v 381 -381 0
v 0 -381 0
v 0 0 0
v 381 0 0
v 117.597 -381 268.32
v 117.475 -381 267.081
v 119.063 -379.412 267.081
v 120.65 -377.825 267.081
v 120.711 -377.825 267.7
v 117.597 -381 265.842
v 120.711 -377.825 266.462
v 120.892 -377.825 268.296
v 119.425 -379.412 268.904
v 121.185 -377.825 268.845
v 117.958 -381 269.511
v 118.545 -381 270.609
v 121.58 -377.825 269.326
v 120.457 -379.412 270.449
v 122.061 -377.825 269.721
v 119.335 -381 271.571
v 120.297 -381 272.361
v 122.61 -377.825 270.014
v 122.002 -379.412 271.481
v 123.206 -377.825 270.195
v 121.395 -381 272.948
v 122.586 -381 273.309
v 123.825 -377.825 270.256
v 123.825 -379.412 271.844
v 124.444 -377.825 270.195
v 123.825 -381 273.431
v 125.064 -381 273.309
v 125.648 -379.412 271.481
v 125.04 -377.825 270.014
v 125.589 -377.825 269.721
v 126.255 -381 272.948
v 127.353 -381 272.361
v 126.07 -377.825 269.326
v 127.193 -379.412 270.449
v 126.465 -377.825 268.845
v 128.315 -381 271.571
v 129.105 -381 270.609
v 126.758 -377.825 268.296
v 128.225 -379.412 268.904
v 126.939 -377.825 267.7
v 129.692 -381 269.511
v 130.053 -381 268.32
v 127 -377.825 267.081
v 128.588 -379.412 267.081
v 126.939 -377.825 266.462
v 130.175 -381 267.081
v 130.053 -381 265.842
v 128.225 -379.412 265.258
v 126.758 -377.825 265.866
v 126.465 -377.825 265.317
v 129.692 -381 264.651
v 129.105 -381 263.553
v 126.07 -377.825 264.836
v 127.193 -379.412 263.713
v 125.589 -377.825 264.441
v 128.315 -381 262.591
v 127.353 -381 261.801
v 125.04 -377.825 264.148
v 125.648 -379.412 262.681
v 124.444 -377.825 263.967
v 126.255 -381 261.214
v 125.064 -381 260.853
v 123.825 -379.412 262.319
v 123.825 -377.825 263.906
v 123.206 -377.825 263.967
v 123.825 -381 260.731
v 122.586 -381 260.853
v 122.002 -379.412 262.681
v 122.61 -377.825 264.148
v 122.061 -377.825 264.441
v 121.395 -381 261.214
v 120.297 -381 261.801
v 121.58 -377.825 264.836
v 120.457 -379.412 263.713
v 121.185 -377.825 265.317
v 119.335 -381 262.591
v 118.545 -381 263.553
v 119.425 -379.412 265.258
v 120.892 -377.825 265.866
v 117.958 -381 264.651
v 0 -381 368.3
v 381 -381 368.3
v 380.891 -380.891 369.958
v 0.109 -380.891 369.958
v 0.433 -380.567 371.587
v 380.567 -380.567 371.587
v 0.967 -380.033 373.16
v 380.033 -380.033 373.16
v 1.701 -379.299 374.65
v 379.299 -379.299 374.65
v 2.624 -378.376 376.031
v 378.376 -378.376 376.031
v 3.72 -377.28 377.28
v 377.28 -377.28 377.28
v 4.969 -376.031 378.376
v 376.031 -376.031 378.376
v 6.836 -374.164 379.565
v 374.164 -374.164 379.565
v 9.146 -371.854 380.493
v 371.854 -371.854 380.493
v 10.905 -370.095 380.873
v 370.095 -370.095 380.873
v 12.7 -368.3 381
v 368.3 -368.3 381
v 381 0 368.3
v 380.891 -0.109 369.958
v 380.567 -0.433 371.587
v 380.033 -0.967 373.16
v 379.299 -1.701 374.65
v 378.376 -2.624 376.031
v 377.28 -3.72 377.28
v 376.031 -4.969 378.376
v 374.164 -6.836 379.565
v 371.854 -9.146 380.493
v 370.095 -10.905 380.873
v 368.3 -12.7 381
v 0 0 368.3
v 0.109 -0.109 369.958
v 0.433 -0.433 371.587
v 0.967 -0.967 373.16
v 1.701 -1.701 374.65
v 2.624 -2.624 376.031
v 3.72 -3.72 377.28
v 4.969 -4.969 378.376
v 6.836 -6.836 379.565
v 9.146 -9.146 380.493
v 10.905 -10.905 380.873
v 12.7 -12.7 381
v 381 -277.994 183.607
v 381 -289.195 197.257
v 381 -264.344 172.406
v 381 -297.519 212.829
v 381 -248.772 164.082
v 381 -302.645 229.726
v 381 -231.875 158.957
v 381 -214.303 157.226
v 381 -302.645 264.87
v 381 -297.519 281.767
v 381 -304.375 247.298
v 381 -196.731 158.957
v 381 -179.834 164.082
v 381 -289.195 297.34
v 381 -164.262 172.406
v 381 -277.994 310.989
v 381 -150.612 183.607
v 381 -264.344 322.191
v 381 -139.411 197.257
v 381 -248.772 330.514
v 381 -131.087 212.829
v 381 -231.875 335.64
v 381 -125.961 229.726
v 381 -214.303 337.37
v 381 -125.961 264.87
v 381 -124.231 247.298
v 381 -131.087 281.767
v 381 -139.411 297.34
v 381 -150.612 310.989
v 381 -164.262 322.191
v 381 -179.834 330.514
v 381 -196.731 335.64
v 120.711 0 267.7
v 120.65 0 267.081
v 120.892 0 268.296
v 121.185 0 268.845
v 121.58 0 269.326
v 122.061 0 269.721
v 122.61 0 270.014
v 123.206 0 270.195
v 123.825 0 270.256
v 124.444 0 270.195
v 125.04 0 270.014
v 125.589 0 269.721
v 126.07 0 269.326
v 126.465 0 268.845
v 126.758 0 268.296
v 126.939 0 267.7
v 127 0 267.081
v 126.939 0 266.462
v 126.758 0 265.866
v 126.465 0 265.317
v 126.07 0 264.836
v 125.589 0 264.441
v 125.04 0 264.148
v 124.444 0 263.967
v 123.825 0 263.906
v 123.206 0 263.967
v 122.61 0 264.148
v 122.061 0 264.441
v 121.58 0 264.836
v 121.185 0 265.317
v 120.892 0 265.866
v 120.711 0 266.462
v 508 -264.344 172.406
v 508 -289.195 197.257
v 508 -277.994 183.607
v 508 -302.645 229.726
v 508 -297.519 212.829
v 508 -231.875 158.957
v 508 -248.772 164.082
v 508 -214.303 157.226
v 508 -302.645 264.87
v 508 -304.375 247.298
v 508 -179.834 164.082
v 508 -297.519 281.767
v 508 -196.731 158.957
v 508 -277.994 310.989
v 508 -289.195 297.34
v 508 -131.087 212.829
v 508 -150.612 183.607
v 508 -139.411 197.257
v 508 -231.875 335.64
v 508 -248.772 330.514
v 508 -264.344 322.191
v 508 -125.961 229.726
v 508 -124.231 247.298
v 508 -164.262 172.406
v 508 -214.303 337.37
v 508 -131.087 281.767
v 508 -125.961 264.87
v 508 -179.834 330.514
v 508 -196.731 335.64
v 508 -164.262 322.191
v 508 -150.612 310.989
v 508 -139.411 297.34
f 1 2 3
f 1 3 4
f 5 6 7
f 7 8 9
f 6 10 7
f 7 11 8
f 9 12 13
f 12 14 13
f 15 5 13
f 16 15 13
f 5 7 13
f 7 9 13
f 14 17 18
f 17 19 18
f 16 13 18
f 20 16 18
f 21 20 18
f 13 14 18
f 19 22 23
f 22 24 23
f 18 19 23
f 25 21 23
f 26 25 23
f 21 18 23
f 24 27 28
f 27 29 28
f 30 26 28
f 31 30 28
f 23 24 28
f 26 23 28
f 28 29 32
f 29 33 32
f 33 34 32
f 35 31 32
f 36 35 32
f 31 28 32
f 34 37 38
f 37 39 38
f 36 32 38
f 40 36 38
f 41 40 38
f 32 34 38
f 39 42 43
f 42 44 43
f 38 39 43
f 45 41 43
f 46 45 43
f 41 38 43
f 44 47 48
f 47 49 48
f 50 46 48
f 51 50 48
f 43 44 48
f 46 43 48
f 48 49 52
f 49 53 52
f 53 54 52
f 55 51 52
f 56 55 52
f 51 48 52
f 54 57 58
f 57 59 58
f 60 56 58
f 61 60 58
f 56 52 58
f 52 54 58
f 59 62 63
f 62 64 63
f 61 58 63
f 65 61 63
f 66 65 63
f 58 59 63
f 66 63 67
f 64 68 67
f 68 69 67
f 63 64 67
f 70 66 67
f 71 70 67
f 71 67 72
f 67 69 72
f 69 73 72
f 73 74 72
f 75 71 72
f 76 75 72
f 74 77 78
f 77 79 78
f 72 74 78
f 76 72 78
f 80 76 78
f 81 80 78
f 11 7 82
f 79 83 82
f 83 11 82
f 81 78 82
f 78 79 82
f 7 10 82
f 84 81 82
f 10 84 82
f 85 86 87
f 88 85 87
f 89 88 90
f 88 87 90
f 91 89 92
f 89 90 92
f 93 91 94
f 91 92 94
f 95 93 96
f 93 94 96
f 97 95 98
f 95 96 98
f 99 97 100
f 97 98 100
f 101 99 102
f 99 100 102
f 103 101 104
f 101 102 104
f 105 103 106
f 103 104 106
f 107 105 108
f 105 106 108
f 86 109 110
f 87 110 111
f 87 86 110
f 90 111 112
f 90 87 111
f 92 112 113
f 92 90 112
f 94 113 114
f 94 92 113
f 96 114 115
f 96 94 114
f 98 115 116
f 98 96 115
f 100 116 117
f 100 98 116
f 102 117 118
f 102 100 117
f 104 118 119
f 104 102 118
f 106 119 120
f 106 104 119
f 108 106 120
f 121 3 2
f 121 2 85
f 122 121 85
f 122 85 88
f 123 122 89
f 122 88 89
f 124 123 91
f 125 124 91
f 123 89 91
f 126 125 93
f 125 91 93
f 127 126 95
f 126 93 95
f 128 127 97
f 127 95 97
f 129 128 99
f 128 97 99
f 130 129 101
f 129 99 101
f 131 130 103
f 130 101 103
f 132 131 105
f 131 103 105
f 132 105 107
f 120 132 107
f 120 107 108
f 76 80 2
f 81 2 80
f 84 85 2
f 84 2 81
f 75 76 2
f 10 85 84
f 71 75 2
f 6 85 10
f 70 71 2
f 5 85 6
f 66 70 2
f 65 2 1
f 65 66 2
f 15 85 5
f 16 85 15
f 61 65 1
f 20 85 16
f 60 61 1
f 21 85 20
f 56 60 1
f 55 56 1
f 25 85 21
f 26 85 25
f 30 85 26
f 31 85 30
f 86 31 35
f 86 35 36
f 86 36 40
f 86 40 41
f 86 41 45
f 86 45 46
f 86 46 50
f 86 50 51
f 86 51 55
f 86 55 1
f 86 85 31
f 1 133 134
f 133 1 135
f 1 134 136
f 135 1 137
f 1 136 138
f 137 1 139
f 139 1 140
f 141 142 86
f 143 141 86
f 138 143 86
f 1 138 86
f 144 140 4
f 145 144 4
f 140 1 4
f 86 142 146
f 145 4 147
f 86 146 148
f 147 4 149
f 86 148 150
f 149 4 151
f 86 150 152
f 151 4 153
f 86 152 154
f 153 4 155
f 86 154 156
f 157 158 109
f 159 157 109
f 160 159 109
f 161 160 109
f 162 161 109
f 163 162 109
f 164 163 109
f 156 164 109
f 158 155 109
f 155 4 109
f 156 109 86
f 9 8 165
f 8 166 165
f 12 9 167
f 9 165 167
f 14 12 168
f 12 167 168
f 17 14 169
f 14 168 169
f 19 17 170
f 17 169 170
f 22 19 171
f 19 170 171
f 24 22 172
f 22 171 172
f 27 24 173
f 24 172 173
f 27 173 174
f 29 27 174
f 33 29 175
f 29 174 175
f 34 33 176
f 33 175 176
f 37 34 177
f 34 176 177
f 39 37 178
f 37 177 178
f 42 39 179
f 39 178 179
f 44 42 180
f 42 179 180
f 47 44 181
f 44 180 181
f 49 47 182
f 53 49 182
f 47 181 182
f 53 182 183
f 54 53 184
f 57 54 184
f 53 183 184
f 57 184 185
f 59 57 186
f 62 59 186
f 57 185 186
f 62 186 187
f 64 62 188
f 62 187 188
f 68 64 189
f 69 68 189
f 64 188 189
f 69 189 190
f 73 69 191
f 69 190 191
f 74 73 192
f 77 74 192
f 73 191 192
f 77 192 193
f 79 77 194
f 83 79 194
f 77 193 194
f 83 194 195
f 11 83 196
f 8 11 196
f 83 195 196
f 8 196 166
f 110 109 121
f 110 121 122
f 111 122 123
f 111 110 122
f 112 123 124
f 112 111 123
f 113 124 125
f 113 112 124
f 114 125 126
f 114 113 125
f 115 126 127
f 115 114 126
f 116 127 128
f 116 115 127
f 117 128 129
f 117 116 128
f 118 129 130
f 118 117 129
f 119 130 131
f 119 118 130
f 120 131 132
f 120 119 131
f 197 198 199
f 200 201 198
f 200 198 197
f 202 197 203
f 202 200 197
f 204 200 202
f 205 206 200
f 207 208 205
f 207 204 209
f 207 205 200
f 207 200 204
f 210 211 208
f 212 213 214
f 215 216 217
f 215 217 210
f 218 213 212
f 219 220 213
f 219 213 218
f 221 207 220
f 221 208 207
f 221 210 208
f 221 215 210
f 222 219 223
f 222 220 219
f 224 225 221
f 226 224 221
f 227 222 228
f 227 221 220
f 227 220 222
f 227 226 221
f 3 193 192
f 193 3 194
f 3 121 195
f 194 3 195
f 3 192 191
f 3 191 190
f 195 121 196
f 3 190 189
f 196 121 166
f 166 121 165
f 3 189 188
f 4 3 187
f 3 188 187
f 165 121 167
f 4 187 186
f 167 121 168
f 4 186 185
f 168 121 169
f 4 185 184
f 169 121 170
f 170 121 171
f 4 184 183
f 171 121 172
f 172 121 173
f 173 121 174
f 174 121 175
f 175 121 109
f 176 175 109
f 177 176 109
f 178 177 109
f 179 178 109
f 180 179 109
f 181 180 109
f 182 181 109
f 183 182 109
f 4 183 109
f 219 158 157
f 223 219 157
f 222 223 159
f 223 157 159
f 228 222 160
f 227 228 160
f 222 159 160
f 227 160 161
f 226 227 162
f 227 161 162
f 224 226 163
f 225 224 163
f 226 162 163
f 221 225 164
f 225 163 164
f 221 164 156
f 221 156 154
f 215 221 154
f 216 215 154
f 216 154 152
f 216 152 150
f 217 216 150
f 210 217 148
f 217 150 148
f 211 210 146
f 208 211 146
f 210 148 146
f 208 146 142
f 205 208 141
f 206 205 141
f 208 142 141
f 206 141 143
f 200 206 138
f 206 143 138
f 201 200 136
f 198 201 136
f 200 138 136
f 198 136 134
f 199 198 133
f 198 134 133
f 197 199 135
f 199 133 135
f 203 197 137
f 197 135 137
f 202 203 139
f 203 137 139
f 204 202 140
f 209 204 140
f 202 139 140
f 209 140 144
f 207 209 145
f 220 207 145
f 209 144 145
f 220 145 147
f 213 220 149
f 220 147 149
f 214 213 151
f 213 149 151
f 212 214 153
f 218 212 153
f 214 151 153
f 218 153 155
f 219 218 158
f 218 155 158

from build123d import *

# Parameters (mm, degrees)
F0_W           = 381
F0_H           = 381
F1_DEPTH       = 381
F3_D           = 6.35
F3_CSINK_D     = 12.7
F3_CSINK_ANGLE = 90
F4_R           = 12.7
F5_R           = 90.072303
F6_DEPTH       = 127


with BuildPart() as f1:
    # F0 (on Front) → F1 (new body)
    with BuildSketch(Plane.XZ):
        with Locations((190.5, 190.5)):
            Rectangle(F0_W, F0_H)
    extrude(amount=F1_DEPTH)

    # F3 (through all)
    with Locations(Plane.XZ.offset(381)):
        with Locations((123.825006, 267.081022)):
            CounterSinkHole(F3_D / 2, F3_CSINK_D / 2, counter_sink_angle=F3_CSINK_ANGLE)

    # F4
    f4_edges = [f1.edges().sort_by_distance(p)[0] for p in [
        (381, -190.5, 381),
        (0, -190.5, 381),
        (190.5, 0, 381),
        (190.5, -381, 381),
    ]]
    fillet(f4_edges, radius=F4_R)

    # F5 (on face) → F6 (join)
    with BuildSketch(Plane.YZ.offset(381)):
        with Locations((-214.303002, 247.298166)):
            Circle(F5_R)
    extrude(amount=F6_DEPTH)


solid = f1.part
